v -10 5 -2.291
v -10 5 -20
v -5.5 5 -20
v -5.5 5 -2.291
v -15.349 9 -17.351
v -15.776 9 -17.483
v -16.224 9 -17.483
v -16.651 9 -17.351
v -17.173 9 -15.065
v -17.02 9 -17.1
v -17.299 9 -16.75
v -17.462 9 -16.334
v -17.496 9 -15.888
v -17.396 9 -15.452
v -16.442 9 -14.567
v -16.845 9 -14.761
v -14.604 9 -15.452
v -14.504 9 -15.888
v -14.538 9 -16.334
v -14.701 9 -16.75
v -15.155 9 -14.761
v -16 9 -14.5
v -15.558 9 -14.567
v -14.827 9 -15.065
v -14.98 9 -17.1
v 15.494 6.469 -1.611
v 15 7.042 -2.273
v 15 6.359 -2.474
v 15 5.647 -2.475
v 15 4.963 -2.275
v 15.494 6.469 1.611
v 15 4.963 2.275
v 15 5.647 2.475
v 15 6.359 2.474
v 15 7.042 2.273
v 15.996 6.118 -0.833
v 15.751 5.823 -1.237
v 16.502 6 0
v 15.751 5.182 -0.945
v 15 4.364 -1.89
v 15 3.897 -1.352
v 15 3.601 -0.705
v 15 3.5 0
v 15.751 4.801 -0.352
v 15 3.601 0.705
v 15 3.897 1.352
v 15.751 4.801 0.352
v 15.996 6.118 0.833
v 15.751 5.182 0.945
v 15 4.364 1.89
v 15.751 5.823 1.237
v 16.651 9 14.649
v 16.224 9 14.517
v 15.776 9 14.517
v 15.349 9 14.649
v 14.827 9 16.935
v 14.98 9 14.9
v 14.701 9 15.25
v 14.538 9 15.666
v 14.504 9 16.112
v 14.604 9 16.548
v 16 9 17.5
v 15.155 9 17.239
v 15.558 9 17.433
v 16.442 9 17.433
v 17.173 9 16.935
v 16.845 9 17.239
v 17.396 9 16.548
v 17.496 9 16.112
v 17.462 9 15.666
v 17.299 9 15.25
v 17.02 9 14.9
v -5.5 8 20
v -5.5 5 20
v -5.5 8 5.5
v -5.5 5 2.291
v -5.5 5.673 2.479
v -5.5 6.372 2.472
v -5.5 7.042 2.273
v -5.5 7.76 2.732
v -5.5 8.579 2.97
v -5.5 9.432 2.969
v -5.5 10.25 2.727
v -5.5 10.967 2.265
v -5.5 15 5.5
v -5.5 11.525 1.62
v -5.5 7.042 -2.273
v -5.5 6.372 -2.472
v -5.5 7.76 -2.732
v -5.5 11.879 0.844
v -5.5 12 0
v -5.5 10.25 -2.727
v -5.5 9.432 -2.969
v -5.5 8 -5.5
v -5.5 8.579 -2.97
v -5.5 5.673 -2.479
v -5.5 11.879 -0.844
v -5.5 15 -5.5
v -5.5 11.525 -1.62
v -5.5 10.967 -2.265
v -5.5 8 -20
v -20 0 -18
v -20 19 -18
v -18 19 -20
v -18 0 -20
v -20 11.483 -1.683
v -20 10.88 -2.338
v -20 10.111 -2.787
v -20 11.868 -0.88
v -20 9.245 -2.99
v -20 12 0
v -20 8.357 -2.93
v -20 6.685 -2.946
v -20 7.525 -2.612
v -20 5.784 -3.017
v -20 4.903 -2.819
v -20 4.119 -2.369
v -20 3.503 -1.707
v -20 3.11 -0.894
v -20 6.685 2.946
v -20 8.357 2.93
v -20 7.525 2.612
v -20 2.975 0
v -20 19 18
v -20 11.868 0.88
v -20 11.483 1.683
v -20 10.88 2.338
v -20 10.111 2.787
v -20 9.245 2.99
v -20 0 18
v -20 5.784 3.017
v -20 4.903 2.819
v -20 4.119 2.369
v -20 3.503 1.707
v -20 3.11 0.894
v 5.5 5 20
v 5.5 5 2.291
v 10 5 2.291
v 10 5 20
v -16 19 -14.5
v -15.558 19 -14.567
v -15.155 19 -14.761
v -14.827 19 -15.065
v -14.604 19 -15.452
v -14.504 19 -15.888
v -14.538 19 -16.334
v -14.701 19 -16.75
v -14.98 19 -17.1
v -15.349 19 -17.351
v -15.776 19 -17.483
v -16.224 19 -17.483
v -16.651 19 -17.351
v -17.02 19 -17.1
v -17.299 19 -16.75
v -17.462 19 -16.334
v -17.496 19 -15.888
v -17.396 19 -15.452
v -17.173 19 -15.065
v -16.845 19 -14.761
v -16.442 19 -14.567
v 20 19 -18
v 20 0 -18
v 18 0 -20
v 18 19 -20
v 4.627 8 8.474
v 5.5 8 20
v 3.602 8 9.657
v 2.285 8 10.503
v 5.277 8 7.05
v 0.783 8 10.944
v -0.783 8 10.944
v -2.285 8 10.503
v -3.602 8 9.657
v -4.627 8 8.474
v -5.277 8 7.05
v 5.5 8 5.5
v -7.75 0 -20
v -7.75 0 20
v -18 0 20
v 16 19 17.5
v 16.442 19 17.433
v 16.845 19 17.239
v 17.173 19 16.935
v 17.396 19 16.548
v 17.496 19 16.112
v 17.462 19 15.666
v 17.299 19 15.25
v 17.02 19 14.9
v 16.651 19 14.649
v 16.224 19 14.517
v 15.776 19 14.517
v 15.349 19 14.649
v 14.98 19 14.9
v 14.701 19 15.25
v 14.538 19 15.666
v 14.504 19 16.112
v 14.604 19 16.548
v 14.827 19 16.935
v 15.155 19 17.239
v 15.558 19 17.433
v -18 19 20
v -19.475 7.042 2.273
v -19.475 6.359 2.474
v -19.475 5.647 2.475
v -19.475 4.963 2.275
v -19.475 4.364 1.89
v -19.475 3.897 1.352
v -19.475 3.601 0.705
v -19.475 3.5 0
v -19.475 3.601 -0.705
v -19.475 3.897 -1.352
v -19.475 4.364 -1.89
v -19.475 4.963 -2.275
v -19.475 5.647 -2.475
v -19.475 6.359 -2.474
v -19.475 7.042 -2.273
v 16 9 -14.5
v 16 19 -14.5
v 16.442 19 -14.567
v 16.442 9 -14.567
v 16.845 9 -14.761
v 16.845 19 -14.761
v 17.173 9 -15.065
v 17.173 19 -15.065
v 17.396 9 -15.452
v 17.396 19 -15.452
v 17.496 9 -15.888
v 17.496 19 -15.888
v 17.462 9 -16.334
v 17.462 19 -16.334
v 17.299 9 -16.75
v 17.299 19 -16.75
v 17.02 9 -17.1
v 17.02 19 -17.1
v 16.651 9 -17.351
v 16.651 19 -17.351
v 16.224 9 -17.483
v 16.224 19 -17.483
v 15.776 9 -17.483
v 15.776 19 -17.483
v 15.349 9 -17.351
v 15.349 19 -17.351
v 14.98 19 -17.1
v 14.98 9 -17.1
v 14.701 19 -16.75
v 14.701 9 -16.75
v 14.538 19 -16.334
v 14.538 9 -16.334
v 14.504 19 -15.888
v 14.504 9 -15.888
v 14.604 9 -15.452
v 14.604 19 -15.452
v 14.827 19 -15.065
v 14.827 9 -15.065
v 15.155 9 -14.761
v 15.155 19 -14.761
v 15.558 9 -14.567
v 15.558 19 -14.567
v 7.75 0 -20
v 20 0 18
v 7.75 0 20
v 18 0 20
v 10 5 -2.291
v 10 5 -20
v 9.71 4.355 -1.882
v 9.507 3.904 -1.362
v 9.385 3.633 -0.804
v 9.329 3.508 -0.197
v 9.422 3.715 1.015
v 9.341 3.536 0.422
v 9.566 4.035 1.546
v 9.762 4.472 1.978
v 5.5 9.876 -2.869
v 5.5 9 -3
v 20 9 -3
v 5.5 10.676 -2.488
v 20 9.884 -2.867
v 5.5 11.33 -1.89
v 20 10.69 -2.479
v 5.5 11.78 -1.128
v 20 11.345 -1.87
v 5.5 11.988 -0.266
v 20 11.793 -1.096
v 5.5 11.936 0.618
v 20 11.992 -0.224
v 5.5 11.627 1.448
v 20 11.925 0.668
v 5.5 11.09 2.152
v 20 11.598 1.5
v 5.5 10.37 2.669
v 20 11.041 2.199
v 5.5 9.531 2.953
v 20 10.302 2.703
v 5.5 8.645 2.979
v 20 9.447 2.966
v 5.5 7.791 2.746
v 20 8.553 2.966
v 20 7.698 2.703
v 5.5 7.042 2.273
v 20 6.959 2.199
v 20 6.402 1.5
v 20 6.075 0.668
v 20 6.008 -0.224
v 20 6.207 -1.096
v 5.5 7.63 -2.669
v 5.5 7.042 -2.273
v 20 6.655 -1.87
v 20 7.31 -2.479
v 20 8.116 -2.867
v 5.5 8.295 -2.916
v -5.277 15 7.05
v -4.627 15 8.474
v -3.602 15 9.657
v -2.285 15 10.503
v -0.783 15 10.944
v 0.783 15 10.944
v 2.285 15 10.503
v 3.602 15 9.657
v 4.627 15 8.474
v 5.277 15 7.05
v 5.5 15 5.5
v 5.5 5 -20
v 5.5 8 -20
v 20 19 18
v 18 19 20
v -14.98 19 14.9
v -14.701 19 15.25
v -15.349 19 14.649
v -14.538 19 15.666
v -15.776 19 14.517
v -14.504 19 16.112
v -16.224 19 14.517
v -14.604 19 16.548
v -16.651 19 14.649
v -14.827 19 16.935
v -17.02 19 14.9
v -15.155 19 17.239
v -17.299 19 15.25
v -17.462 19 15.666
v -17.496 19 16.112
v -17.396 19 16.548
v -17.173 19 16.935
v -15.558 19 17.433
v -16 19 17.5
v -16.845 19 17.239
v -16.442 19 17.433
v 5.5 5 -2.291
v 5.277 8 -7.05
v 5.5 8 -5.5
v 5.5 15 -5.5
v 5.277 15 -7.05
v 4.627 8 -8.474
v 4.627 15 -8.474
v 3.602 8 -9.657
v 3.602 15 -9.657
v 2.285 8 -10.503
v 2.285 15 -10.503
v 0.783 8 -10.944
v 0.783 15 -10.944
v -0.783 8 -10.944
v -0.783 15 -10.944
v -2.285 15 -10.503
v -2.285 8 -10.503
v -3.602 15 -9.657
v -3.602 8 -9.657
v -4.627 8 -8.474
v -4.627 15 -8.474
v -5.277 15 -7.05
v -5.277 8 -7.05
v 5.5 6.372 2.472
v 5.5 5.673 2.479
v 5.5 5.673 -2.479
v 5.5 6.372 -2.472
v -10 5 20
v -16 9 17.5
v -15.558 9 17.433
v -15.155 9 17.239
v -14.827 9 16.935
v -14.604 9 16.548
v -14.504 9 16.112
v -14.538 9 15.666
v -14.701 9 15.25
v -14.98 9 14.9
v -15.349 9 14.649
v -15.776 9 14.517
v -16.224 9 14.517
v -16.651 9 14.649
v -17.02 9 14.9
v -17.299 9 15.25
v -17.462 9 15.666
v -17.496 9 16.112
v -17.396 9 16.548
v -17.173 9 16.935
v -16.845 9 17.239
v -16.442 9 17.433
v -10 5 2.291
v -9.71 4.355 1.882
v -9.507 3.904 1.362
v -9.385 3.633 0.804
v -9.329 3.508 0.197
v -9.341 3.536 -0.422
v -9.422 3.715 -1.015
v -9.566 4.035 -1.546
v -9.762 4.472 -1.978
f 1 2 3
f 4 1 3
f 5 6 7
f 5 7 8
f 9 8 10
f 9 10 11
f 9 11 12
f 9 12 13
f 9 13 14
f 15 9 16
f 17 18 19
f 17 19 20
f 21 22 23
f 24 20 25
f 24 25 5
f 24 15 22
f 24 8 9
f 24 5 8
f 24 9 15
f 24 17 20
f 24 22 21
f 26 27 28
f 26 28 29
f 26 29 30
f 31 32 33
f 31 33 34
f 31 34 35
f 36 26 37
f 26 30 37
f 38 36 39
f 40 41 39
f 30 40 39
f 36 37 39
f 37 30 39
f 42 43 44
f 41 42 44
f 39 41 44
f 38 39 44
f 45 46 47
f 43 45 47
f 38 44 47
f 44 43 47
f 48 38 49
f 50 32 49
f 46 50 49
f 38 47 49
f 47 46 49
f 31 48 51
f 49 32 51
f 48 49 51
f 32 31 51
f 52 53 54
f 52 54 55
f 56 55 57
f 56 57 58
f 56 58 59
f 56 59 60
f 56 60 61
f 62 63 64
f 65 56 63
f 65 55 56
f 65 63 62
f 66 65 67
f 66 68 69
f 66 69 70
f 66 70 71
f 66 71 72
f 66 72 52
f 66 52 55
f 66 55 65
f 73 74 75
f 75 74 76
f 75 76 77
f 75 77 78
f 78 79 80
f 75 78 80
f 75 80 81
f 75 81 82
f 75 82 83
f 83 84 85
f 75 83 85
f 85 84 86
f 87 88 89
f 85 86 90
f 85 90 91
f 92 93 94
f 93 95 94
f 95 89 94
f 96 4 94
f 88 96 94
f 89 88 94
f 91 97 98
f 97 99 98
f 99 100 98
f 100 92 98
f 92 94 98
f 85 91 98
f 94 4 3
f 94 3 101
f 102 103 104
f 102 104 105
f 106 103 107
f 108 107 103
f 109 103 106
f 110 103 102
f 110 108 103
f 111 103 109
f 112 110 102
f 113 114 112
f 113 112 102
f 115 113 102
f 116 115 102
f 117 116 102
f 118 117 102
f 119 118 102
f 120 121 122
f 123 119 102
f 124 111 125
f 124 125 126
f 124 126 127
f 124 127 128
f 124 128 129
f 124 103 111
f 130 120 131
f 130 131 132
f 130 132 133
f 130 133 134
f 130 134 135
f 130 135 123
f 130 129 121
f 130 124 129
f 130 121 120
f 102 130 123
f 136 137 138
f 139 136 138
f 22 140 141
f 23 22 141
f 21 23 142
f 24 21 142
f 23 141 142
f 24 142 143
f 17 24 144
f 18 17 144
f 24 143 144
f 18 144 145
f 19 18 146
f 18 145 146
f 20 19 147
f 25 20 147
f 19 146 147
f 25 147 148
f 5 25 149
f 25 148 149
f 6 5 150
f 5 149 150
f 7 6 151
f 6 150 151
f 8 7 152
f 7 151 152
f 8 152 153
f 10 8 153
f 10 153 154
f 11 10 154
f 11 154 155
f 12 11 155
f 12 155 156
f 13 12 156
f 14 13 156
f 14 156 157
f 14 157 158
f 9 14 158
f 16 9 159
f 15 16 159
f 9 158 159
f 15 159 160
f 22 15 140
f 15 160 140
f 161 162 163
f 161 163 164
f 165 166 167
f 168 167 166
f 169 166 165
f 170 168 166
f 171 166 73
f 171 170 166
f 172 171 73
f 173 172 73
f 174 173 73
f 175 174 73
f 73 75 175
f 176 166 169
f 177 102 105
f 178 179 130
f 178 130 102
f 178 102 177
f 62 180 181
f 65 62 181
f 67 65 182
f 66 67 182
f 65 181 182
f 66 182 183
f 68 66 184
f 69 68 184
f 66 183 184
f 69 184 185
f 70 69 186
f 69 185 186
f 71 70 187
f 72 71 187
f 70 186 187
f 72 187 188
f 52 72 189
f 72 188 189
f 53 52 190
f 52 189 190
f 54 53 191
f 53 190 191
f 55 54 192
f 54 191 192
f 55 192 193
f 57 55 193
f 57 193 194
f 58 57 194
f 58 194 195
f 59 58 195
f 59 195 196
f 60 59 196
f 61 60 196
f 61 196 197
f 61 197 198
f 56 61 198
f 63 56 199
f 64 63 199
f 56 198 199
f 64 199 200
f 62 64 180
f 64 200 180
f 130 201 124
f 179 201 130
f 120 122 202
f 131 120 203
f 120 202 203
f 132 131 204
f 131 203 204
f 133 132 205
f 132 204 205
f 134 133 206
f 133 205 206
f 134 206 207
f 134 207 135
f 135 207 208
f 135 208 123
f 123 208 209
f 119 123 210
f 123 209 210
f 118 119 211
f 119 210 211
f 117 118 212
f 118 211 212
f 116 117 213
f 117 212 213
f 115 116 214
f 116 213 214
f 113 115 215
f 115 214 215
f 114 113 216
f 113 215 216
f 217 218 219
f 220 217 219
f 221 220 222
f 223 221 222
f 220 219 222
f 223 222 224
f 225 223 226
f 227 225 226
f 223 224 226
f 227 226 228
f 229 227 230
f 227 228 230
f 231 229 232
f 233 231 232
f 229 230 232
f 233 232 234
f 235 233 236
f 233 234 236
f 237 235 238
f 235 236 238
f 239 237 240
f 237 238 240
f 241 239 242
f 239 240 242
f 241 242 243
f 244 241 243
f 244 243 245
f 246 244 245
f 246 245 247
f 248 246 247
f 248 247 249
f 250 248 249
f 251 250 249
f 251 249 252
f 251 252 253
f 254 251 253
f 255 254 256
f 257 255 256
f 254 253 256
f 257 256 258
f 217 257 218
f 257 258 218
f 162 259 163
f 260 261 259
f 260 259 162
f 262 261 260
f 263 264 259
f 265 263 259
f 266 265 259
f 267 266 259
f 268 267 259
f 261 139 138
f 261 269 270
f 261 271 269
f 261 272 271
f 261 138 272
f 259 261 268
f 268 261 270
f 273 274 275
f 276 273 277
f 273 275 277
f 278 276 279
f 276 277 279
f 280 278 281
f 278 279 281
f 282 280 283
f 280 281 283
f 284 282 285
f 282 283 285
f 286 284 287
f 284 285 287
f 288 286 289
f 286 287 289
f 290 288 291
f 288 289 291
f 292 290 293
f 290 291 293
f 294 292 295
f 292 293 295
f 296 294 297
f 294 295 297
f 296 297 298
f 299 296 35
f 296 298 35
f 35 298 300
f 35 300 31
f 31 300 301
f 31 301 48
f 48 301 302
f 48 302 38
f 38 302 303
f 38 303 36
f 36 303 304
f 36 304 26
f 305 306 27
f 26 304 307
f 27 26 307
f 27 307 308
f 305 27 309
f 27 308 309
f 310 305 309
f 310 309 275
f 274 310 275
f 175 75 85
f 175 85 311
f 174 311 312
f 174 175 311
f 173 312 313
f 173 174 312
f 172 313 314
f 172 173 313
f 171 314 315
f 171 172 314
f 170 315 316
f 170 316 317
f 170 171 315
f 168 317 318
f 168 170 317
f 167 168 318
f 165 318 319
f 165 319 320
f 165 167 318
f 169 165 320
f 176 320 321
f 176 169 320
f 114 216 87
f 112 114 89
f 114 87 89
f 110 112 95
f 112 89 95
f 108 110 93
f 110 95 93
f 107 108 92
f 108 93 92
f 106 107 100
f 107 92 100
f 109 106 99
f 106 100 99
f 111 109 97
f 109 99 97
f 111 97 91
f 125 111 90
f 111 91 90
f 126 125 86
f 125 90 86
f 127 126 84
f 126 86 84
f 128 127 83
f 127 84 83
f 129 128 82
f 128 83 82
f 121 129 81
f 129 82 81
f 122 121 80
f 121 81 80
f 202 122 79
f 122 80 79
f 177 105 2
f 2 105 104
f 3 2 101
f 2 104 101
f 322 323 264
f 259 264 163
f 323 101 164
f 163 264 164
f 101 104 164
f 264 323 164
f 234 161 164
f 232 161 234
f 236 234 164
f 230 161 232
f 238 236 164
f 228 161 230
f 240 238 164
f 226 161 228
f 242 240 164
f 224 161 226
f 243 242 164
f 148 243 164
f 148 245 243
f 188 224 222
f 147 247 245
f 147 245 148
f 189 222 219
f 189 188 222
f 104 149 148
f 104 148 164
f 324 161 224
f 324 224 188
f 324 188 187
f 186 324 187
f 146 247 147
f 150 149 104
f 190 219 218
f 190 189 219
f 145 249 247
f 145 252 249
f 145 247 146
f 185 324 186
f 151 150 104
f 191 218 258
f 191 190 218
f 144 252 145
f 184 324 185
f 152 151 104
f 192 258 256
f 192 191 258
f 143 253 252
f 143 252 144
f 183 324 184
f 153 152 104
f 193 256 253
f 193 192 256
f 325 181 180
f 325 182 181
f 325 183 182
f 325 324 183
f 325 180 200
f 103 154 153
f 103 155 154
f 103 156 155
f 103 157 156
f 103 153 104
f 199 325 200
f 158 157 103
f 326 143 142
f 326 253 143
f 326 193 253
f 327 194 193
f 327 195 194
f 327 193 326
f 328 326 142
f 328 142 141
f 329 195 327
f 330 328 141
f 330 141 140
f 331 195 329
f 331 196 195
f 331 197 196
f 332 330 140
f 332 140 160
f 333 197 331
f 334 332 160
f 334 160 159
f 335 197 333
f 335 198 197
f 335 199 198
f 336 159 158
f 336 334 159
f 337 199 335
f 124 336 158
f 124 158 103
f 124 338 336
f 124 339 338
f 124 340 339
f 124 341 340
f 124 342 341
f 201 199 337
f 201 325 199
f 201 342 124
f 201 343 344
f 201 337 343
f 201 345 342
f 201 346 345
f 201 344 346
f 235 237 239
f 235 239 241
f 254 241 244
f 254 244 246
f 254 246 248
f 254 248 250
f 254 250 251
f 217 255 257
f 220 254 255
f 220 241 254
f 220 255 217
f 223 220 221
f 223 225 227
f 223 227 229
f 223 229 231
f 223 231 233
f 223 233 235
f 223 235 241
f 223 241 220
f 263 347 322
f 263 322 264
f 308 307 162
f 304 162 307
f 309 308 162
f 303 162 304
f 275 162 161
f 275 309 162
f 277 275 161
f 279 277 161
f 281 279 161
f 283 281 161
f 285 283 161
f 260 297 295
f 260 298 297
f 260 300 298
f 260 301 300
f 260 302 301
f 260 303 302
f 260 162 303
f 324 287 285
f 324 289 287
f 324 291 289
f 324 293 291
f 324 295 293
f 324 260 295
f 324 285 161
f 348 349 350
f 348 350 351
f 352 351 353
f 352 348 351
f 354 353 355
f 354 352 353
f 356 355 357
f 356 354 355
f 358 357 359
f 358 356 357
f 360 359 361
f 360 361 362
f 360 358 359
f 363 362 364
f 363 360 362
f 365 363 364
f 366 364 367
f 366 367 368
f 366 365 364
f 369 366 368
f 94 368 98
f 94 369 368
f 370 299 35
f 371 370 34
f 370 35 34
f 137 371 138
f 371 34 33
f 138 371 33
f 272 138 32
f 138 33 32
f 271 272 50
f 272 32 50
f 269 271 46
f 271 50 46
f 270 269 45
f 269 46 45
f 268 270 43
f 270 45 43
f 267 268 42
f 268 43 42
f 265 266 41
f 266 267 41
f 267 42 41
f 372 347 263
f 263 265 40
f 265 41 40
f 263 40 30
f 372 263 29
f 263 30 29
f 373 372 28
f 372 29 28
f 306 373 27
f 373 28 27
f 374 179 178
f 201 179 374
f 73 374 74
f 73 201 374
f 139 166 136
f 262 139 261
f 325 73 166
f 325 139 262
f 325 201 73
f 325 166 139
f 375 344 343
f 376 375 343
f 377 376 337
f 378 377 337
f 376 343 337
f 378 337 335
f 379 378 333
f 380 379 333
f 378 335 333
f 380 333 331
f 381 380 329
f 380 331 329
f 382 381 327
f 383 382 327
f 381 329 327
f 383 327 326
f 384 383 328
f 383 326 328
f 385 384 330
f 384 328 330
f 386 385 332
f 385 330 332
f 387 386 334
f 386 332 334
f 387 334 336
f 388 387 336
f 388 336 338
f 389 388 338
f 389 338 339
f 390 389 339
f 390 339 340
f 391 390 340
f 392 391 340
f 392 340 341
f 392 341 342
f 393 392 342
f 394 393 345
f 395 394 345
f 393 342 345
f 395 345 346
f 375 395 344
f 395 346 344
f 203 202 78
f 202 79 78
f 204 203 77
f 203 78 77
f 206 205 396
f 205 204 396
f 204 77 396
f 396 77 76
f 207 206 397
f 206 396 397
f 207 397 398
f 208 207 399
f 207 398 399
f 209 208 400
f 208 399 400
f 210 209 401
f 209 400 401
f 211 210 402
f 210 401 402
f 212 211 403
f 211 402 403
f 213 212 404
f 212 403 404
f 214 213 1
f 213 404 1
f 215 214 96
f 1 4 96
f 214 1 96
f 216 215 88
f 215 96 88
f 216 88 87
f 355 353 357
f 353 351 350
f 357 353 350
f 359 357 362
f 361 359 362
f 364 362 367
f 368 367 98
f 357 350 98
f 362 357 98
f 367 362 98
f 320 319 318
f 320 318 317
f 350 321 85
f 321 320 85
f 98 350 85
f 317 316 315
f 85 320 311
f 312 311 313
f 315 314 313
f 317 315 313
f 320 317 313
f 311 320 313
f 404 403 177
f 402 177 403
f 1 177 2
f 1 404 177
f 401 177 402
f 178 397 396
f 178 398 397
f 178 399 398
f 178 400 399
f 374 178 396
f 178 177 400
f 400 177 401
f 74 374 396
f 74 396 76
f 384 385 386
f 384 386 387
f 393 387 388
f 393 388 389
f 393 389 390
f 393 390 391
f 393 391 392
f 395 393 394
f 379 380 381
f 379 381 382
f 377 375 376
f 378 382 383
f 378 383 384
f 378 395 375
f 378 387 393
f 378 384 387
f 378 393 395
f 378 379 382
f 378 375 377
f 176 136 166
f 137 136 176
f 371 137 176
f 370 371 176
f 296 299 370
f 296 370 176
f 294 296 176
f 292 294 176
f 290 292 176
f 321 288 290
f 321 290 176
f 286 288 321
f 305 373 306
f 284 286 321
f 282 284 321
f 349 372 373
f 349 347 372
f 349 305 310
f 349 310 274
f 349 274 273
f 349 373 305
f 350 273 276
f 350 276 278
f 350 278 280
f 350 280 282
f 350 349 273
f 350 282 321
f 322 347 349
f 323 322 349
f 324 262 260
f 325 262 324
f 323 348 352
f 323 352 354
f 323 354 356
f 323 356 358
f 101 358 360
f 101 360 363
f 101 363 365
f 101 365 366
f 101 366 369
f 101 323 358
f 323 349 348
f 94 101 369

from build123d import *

# Parameters (mm, degrees)
EXTRUDE_1_DEPTH              = 20
CUT_EXTRUDE_1_REACH          = 50.59
SKETCH_8_W                   = 11
SKETCH_8_H                   = 6
HOLE_WIZARD_M6_3_D           = 5
HOLE_WIZARD_M6_3_DEPTH       = 35
HOLE_WIZARD_M6_3_CSINK_D     = 6.05
HOLE_WIZARD_M6_3_CSINK_ANGLE = 90
HOLE_WIZARD_M6_3_TIP         = 1.502151548
SKETCH_13_R                  = 3
CUT_EXTRUDE_2_DEPTH          = 45
CUT_EXTRUDE_3_DEPTH          = 7
CHAMFER_1_SIZE               = 2
SKETCH_15_R                  = 1.5
CUT_EXTRUDE_4_DEPTH          = 10


with BuildPart() as part:
    # 草图1 → 凸台-拉伸1 (new, symmetric)
    with BuildSketch(Plane.XY):
        Polygon((-10, 5), (10, 5), (7.75, 0), (20, 0), (20, 19), (-20, 19), (-20, 0), (-7.75, 0), align=None)
    extrude(amount=EXTRUDE_1_DEPTH, both=True)

    # 草图8 → 切除-拉伸1 (cut, up to next)
    with BuildSketch(Plane(origin=(0, 0, -20), x_dir=(-1, 0, 0), z_dir=(0, 0, -1)), mode=Mode.PRIVATE) as cut_extrude_1_sk1:
        with Locations((0, 5)):
            Rectangle(SKETCH_8_W, SKETCH_8_H)
    cut_extrude_1_tool1 = extrude(cut_extrude_1_sk1.sketch, amount=-CUT_EXTRUDE_1_REACH, mode=Mode.PRIVATE) & part.part
    add(cut_extrude_1_tool1.solids().sort_by_distance((0, 5, -20))[0], mode=Mode.SUBTRACT)

    # M6 螺纹孔3
    with Locations(Plane.ZY.offset(20)):
        with Locations((0, 6)):
            CounterSinkHole(HOLE_WIZARD_M6_3_D / 2, HOLE_WIZARD_M6_3_CSINK_D / 2, depth=HOLE_WIZARD_M6_3_DEPTH, counter_sink_angle=HOLE_WIZARD_M6_3_CSINK_ANGLE)
            with Locations((0, 0, -(HOLE_WIZARD_M6_3_DEPTH + HOLE_WIZARD_M6_3_TIP / 2))):  # 118° drill point
                Cone(0, HOLE_WIZARD_M6_3_D / 2, HOLE_WIZARD_M6_3_TIP, mode=Mode.SUBTRACT)

    # 草图13 → 切除-拉伸2 (cut)
    with BuildSketch(Plane(origin=(20, 0, 0), x_dir=(0, 0, -1), z_dir=(1, 0, 0))):
        with Locations((0, 9)):
            Circle(SKETCH_13_R)
    extrude(amount=-CUT_EXTRUDE_2_DEPTH, mode=Mode.SUBTRACT)

    # 草图14 → 切除-拉伸3 (cut)
    with BuildSketch(Plane.XZ.offset(-8)):
        with BuildLine():
            Line((5.5, 5.5), (5.5, -5.5))
            ThreePointArc((5.5, -5.5), (0, -11), (-5.5, -5.5))
            Line((-5.5, -5.5), (-5.5, 5.5))
            ThreePointArc((-5.5, 5.5), (0, 11), (5.5, 5.5))
        make_face()
    extrude(amount=-CUT_EXTRUDE_3_DEPTH, mode=Mode.SUBTRACT)

    # 倒角1
    chamfer_1_edges = [part.edges().sort_by_distance(p)[0] for p in [
        (20, 9.5, 20),
        (-20, 9.5, 20),
        (-20, 9.5, -20),
        (20, 9.5, -20),
    ]]
    chamfer(chamfer_1_edges, length=CHAMFER_1_SIZE)

    # 草图15 → 切除-拉伸4 (cut)
    with BuildSketch(Plane(origin=(0, 19, 0), x_dir=(1, 0, 0), z_dir=(0, 1, 0))):
        with Locations(Location((-16, 16, 0), (0, 0, 270))):
            Circle(SKETCH_15_R)
        with Locations(Location((16, 16, 0), (0, 0, 270))):
            Circle(SKETCH_15_R)
        with Locations(Location((16, -16, 0), (0, 0, 270))):
            Circle(SKETCH_15_R)
        with Locations(Location((-16, -16, 0), (0, 0, 270))):
            Circle(SKETCH_15_R)
    extrude(amount=-CUT_EXTRUDE_4_DEPTH, mode=Mode.SUBTRACT)


solid = part.part
